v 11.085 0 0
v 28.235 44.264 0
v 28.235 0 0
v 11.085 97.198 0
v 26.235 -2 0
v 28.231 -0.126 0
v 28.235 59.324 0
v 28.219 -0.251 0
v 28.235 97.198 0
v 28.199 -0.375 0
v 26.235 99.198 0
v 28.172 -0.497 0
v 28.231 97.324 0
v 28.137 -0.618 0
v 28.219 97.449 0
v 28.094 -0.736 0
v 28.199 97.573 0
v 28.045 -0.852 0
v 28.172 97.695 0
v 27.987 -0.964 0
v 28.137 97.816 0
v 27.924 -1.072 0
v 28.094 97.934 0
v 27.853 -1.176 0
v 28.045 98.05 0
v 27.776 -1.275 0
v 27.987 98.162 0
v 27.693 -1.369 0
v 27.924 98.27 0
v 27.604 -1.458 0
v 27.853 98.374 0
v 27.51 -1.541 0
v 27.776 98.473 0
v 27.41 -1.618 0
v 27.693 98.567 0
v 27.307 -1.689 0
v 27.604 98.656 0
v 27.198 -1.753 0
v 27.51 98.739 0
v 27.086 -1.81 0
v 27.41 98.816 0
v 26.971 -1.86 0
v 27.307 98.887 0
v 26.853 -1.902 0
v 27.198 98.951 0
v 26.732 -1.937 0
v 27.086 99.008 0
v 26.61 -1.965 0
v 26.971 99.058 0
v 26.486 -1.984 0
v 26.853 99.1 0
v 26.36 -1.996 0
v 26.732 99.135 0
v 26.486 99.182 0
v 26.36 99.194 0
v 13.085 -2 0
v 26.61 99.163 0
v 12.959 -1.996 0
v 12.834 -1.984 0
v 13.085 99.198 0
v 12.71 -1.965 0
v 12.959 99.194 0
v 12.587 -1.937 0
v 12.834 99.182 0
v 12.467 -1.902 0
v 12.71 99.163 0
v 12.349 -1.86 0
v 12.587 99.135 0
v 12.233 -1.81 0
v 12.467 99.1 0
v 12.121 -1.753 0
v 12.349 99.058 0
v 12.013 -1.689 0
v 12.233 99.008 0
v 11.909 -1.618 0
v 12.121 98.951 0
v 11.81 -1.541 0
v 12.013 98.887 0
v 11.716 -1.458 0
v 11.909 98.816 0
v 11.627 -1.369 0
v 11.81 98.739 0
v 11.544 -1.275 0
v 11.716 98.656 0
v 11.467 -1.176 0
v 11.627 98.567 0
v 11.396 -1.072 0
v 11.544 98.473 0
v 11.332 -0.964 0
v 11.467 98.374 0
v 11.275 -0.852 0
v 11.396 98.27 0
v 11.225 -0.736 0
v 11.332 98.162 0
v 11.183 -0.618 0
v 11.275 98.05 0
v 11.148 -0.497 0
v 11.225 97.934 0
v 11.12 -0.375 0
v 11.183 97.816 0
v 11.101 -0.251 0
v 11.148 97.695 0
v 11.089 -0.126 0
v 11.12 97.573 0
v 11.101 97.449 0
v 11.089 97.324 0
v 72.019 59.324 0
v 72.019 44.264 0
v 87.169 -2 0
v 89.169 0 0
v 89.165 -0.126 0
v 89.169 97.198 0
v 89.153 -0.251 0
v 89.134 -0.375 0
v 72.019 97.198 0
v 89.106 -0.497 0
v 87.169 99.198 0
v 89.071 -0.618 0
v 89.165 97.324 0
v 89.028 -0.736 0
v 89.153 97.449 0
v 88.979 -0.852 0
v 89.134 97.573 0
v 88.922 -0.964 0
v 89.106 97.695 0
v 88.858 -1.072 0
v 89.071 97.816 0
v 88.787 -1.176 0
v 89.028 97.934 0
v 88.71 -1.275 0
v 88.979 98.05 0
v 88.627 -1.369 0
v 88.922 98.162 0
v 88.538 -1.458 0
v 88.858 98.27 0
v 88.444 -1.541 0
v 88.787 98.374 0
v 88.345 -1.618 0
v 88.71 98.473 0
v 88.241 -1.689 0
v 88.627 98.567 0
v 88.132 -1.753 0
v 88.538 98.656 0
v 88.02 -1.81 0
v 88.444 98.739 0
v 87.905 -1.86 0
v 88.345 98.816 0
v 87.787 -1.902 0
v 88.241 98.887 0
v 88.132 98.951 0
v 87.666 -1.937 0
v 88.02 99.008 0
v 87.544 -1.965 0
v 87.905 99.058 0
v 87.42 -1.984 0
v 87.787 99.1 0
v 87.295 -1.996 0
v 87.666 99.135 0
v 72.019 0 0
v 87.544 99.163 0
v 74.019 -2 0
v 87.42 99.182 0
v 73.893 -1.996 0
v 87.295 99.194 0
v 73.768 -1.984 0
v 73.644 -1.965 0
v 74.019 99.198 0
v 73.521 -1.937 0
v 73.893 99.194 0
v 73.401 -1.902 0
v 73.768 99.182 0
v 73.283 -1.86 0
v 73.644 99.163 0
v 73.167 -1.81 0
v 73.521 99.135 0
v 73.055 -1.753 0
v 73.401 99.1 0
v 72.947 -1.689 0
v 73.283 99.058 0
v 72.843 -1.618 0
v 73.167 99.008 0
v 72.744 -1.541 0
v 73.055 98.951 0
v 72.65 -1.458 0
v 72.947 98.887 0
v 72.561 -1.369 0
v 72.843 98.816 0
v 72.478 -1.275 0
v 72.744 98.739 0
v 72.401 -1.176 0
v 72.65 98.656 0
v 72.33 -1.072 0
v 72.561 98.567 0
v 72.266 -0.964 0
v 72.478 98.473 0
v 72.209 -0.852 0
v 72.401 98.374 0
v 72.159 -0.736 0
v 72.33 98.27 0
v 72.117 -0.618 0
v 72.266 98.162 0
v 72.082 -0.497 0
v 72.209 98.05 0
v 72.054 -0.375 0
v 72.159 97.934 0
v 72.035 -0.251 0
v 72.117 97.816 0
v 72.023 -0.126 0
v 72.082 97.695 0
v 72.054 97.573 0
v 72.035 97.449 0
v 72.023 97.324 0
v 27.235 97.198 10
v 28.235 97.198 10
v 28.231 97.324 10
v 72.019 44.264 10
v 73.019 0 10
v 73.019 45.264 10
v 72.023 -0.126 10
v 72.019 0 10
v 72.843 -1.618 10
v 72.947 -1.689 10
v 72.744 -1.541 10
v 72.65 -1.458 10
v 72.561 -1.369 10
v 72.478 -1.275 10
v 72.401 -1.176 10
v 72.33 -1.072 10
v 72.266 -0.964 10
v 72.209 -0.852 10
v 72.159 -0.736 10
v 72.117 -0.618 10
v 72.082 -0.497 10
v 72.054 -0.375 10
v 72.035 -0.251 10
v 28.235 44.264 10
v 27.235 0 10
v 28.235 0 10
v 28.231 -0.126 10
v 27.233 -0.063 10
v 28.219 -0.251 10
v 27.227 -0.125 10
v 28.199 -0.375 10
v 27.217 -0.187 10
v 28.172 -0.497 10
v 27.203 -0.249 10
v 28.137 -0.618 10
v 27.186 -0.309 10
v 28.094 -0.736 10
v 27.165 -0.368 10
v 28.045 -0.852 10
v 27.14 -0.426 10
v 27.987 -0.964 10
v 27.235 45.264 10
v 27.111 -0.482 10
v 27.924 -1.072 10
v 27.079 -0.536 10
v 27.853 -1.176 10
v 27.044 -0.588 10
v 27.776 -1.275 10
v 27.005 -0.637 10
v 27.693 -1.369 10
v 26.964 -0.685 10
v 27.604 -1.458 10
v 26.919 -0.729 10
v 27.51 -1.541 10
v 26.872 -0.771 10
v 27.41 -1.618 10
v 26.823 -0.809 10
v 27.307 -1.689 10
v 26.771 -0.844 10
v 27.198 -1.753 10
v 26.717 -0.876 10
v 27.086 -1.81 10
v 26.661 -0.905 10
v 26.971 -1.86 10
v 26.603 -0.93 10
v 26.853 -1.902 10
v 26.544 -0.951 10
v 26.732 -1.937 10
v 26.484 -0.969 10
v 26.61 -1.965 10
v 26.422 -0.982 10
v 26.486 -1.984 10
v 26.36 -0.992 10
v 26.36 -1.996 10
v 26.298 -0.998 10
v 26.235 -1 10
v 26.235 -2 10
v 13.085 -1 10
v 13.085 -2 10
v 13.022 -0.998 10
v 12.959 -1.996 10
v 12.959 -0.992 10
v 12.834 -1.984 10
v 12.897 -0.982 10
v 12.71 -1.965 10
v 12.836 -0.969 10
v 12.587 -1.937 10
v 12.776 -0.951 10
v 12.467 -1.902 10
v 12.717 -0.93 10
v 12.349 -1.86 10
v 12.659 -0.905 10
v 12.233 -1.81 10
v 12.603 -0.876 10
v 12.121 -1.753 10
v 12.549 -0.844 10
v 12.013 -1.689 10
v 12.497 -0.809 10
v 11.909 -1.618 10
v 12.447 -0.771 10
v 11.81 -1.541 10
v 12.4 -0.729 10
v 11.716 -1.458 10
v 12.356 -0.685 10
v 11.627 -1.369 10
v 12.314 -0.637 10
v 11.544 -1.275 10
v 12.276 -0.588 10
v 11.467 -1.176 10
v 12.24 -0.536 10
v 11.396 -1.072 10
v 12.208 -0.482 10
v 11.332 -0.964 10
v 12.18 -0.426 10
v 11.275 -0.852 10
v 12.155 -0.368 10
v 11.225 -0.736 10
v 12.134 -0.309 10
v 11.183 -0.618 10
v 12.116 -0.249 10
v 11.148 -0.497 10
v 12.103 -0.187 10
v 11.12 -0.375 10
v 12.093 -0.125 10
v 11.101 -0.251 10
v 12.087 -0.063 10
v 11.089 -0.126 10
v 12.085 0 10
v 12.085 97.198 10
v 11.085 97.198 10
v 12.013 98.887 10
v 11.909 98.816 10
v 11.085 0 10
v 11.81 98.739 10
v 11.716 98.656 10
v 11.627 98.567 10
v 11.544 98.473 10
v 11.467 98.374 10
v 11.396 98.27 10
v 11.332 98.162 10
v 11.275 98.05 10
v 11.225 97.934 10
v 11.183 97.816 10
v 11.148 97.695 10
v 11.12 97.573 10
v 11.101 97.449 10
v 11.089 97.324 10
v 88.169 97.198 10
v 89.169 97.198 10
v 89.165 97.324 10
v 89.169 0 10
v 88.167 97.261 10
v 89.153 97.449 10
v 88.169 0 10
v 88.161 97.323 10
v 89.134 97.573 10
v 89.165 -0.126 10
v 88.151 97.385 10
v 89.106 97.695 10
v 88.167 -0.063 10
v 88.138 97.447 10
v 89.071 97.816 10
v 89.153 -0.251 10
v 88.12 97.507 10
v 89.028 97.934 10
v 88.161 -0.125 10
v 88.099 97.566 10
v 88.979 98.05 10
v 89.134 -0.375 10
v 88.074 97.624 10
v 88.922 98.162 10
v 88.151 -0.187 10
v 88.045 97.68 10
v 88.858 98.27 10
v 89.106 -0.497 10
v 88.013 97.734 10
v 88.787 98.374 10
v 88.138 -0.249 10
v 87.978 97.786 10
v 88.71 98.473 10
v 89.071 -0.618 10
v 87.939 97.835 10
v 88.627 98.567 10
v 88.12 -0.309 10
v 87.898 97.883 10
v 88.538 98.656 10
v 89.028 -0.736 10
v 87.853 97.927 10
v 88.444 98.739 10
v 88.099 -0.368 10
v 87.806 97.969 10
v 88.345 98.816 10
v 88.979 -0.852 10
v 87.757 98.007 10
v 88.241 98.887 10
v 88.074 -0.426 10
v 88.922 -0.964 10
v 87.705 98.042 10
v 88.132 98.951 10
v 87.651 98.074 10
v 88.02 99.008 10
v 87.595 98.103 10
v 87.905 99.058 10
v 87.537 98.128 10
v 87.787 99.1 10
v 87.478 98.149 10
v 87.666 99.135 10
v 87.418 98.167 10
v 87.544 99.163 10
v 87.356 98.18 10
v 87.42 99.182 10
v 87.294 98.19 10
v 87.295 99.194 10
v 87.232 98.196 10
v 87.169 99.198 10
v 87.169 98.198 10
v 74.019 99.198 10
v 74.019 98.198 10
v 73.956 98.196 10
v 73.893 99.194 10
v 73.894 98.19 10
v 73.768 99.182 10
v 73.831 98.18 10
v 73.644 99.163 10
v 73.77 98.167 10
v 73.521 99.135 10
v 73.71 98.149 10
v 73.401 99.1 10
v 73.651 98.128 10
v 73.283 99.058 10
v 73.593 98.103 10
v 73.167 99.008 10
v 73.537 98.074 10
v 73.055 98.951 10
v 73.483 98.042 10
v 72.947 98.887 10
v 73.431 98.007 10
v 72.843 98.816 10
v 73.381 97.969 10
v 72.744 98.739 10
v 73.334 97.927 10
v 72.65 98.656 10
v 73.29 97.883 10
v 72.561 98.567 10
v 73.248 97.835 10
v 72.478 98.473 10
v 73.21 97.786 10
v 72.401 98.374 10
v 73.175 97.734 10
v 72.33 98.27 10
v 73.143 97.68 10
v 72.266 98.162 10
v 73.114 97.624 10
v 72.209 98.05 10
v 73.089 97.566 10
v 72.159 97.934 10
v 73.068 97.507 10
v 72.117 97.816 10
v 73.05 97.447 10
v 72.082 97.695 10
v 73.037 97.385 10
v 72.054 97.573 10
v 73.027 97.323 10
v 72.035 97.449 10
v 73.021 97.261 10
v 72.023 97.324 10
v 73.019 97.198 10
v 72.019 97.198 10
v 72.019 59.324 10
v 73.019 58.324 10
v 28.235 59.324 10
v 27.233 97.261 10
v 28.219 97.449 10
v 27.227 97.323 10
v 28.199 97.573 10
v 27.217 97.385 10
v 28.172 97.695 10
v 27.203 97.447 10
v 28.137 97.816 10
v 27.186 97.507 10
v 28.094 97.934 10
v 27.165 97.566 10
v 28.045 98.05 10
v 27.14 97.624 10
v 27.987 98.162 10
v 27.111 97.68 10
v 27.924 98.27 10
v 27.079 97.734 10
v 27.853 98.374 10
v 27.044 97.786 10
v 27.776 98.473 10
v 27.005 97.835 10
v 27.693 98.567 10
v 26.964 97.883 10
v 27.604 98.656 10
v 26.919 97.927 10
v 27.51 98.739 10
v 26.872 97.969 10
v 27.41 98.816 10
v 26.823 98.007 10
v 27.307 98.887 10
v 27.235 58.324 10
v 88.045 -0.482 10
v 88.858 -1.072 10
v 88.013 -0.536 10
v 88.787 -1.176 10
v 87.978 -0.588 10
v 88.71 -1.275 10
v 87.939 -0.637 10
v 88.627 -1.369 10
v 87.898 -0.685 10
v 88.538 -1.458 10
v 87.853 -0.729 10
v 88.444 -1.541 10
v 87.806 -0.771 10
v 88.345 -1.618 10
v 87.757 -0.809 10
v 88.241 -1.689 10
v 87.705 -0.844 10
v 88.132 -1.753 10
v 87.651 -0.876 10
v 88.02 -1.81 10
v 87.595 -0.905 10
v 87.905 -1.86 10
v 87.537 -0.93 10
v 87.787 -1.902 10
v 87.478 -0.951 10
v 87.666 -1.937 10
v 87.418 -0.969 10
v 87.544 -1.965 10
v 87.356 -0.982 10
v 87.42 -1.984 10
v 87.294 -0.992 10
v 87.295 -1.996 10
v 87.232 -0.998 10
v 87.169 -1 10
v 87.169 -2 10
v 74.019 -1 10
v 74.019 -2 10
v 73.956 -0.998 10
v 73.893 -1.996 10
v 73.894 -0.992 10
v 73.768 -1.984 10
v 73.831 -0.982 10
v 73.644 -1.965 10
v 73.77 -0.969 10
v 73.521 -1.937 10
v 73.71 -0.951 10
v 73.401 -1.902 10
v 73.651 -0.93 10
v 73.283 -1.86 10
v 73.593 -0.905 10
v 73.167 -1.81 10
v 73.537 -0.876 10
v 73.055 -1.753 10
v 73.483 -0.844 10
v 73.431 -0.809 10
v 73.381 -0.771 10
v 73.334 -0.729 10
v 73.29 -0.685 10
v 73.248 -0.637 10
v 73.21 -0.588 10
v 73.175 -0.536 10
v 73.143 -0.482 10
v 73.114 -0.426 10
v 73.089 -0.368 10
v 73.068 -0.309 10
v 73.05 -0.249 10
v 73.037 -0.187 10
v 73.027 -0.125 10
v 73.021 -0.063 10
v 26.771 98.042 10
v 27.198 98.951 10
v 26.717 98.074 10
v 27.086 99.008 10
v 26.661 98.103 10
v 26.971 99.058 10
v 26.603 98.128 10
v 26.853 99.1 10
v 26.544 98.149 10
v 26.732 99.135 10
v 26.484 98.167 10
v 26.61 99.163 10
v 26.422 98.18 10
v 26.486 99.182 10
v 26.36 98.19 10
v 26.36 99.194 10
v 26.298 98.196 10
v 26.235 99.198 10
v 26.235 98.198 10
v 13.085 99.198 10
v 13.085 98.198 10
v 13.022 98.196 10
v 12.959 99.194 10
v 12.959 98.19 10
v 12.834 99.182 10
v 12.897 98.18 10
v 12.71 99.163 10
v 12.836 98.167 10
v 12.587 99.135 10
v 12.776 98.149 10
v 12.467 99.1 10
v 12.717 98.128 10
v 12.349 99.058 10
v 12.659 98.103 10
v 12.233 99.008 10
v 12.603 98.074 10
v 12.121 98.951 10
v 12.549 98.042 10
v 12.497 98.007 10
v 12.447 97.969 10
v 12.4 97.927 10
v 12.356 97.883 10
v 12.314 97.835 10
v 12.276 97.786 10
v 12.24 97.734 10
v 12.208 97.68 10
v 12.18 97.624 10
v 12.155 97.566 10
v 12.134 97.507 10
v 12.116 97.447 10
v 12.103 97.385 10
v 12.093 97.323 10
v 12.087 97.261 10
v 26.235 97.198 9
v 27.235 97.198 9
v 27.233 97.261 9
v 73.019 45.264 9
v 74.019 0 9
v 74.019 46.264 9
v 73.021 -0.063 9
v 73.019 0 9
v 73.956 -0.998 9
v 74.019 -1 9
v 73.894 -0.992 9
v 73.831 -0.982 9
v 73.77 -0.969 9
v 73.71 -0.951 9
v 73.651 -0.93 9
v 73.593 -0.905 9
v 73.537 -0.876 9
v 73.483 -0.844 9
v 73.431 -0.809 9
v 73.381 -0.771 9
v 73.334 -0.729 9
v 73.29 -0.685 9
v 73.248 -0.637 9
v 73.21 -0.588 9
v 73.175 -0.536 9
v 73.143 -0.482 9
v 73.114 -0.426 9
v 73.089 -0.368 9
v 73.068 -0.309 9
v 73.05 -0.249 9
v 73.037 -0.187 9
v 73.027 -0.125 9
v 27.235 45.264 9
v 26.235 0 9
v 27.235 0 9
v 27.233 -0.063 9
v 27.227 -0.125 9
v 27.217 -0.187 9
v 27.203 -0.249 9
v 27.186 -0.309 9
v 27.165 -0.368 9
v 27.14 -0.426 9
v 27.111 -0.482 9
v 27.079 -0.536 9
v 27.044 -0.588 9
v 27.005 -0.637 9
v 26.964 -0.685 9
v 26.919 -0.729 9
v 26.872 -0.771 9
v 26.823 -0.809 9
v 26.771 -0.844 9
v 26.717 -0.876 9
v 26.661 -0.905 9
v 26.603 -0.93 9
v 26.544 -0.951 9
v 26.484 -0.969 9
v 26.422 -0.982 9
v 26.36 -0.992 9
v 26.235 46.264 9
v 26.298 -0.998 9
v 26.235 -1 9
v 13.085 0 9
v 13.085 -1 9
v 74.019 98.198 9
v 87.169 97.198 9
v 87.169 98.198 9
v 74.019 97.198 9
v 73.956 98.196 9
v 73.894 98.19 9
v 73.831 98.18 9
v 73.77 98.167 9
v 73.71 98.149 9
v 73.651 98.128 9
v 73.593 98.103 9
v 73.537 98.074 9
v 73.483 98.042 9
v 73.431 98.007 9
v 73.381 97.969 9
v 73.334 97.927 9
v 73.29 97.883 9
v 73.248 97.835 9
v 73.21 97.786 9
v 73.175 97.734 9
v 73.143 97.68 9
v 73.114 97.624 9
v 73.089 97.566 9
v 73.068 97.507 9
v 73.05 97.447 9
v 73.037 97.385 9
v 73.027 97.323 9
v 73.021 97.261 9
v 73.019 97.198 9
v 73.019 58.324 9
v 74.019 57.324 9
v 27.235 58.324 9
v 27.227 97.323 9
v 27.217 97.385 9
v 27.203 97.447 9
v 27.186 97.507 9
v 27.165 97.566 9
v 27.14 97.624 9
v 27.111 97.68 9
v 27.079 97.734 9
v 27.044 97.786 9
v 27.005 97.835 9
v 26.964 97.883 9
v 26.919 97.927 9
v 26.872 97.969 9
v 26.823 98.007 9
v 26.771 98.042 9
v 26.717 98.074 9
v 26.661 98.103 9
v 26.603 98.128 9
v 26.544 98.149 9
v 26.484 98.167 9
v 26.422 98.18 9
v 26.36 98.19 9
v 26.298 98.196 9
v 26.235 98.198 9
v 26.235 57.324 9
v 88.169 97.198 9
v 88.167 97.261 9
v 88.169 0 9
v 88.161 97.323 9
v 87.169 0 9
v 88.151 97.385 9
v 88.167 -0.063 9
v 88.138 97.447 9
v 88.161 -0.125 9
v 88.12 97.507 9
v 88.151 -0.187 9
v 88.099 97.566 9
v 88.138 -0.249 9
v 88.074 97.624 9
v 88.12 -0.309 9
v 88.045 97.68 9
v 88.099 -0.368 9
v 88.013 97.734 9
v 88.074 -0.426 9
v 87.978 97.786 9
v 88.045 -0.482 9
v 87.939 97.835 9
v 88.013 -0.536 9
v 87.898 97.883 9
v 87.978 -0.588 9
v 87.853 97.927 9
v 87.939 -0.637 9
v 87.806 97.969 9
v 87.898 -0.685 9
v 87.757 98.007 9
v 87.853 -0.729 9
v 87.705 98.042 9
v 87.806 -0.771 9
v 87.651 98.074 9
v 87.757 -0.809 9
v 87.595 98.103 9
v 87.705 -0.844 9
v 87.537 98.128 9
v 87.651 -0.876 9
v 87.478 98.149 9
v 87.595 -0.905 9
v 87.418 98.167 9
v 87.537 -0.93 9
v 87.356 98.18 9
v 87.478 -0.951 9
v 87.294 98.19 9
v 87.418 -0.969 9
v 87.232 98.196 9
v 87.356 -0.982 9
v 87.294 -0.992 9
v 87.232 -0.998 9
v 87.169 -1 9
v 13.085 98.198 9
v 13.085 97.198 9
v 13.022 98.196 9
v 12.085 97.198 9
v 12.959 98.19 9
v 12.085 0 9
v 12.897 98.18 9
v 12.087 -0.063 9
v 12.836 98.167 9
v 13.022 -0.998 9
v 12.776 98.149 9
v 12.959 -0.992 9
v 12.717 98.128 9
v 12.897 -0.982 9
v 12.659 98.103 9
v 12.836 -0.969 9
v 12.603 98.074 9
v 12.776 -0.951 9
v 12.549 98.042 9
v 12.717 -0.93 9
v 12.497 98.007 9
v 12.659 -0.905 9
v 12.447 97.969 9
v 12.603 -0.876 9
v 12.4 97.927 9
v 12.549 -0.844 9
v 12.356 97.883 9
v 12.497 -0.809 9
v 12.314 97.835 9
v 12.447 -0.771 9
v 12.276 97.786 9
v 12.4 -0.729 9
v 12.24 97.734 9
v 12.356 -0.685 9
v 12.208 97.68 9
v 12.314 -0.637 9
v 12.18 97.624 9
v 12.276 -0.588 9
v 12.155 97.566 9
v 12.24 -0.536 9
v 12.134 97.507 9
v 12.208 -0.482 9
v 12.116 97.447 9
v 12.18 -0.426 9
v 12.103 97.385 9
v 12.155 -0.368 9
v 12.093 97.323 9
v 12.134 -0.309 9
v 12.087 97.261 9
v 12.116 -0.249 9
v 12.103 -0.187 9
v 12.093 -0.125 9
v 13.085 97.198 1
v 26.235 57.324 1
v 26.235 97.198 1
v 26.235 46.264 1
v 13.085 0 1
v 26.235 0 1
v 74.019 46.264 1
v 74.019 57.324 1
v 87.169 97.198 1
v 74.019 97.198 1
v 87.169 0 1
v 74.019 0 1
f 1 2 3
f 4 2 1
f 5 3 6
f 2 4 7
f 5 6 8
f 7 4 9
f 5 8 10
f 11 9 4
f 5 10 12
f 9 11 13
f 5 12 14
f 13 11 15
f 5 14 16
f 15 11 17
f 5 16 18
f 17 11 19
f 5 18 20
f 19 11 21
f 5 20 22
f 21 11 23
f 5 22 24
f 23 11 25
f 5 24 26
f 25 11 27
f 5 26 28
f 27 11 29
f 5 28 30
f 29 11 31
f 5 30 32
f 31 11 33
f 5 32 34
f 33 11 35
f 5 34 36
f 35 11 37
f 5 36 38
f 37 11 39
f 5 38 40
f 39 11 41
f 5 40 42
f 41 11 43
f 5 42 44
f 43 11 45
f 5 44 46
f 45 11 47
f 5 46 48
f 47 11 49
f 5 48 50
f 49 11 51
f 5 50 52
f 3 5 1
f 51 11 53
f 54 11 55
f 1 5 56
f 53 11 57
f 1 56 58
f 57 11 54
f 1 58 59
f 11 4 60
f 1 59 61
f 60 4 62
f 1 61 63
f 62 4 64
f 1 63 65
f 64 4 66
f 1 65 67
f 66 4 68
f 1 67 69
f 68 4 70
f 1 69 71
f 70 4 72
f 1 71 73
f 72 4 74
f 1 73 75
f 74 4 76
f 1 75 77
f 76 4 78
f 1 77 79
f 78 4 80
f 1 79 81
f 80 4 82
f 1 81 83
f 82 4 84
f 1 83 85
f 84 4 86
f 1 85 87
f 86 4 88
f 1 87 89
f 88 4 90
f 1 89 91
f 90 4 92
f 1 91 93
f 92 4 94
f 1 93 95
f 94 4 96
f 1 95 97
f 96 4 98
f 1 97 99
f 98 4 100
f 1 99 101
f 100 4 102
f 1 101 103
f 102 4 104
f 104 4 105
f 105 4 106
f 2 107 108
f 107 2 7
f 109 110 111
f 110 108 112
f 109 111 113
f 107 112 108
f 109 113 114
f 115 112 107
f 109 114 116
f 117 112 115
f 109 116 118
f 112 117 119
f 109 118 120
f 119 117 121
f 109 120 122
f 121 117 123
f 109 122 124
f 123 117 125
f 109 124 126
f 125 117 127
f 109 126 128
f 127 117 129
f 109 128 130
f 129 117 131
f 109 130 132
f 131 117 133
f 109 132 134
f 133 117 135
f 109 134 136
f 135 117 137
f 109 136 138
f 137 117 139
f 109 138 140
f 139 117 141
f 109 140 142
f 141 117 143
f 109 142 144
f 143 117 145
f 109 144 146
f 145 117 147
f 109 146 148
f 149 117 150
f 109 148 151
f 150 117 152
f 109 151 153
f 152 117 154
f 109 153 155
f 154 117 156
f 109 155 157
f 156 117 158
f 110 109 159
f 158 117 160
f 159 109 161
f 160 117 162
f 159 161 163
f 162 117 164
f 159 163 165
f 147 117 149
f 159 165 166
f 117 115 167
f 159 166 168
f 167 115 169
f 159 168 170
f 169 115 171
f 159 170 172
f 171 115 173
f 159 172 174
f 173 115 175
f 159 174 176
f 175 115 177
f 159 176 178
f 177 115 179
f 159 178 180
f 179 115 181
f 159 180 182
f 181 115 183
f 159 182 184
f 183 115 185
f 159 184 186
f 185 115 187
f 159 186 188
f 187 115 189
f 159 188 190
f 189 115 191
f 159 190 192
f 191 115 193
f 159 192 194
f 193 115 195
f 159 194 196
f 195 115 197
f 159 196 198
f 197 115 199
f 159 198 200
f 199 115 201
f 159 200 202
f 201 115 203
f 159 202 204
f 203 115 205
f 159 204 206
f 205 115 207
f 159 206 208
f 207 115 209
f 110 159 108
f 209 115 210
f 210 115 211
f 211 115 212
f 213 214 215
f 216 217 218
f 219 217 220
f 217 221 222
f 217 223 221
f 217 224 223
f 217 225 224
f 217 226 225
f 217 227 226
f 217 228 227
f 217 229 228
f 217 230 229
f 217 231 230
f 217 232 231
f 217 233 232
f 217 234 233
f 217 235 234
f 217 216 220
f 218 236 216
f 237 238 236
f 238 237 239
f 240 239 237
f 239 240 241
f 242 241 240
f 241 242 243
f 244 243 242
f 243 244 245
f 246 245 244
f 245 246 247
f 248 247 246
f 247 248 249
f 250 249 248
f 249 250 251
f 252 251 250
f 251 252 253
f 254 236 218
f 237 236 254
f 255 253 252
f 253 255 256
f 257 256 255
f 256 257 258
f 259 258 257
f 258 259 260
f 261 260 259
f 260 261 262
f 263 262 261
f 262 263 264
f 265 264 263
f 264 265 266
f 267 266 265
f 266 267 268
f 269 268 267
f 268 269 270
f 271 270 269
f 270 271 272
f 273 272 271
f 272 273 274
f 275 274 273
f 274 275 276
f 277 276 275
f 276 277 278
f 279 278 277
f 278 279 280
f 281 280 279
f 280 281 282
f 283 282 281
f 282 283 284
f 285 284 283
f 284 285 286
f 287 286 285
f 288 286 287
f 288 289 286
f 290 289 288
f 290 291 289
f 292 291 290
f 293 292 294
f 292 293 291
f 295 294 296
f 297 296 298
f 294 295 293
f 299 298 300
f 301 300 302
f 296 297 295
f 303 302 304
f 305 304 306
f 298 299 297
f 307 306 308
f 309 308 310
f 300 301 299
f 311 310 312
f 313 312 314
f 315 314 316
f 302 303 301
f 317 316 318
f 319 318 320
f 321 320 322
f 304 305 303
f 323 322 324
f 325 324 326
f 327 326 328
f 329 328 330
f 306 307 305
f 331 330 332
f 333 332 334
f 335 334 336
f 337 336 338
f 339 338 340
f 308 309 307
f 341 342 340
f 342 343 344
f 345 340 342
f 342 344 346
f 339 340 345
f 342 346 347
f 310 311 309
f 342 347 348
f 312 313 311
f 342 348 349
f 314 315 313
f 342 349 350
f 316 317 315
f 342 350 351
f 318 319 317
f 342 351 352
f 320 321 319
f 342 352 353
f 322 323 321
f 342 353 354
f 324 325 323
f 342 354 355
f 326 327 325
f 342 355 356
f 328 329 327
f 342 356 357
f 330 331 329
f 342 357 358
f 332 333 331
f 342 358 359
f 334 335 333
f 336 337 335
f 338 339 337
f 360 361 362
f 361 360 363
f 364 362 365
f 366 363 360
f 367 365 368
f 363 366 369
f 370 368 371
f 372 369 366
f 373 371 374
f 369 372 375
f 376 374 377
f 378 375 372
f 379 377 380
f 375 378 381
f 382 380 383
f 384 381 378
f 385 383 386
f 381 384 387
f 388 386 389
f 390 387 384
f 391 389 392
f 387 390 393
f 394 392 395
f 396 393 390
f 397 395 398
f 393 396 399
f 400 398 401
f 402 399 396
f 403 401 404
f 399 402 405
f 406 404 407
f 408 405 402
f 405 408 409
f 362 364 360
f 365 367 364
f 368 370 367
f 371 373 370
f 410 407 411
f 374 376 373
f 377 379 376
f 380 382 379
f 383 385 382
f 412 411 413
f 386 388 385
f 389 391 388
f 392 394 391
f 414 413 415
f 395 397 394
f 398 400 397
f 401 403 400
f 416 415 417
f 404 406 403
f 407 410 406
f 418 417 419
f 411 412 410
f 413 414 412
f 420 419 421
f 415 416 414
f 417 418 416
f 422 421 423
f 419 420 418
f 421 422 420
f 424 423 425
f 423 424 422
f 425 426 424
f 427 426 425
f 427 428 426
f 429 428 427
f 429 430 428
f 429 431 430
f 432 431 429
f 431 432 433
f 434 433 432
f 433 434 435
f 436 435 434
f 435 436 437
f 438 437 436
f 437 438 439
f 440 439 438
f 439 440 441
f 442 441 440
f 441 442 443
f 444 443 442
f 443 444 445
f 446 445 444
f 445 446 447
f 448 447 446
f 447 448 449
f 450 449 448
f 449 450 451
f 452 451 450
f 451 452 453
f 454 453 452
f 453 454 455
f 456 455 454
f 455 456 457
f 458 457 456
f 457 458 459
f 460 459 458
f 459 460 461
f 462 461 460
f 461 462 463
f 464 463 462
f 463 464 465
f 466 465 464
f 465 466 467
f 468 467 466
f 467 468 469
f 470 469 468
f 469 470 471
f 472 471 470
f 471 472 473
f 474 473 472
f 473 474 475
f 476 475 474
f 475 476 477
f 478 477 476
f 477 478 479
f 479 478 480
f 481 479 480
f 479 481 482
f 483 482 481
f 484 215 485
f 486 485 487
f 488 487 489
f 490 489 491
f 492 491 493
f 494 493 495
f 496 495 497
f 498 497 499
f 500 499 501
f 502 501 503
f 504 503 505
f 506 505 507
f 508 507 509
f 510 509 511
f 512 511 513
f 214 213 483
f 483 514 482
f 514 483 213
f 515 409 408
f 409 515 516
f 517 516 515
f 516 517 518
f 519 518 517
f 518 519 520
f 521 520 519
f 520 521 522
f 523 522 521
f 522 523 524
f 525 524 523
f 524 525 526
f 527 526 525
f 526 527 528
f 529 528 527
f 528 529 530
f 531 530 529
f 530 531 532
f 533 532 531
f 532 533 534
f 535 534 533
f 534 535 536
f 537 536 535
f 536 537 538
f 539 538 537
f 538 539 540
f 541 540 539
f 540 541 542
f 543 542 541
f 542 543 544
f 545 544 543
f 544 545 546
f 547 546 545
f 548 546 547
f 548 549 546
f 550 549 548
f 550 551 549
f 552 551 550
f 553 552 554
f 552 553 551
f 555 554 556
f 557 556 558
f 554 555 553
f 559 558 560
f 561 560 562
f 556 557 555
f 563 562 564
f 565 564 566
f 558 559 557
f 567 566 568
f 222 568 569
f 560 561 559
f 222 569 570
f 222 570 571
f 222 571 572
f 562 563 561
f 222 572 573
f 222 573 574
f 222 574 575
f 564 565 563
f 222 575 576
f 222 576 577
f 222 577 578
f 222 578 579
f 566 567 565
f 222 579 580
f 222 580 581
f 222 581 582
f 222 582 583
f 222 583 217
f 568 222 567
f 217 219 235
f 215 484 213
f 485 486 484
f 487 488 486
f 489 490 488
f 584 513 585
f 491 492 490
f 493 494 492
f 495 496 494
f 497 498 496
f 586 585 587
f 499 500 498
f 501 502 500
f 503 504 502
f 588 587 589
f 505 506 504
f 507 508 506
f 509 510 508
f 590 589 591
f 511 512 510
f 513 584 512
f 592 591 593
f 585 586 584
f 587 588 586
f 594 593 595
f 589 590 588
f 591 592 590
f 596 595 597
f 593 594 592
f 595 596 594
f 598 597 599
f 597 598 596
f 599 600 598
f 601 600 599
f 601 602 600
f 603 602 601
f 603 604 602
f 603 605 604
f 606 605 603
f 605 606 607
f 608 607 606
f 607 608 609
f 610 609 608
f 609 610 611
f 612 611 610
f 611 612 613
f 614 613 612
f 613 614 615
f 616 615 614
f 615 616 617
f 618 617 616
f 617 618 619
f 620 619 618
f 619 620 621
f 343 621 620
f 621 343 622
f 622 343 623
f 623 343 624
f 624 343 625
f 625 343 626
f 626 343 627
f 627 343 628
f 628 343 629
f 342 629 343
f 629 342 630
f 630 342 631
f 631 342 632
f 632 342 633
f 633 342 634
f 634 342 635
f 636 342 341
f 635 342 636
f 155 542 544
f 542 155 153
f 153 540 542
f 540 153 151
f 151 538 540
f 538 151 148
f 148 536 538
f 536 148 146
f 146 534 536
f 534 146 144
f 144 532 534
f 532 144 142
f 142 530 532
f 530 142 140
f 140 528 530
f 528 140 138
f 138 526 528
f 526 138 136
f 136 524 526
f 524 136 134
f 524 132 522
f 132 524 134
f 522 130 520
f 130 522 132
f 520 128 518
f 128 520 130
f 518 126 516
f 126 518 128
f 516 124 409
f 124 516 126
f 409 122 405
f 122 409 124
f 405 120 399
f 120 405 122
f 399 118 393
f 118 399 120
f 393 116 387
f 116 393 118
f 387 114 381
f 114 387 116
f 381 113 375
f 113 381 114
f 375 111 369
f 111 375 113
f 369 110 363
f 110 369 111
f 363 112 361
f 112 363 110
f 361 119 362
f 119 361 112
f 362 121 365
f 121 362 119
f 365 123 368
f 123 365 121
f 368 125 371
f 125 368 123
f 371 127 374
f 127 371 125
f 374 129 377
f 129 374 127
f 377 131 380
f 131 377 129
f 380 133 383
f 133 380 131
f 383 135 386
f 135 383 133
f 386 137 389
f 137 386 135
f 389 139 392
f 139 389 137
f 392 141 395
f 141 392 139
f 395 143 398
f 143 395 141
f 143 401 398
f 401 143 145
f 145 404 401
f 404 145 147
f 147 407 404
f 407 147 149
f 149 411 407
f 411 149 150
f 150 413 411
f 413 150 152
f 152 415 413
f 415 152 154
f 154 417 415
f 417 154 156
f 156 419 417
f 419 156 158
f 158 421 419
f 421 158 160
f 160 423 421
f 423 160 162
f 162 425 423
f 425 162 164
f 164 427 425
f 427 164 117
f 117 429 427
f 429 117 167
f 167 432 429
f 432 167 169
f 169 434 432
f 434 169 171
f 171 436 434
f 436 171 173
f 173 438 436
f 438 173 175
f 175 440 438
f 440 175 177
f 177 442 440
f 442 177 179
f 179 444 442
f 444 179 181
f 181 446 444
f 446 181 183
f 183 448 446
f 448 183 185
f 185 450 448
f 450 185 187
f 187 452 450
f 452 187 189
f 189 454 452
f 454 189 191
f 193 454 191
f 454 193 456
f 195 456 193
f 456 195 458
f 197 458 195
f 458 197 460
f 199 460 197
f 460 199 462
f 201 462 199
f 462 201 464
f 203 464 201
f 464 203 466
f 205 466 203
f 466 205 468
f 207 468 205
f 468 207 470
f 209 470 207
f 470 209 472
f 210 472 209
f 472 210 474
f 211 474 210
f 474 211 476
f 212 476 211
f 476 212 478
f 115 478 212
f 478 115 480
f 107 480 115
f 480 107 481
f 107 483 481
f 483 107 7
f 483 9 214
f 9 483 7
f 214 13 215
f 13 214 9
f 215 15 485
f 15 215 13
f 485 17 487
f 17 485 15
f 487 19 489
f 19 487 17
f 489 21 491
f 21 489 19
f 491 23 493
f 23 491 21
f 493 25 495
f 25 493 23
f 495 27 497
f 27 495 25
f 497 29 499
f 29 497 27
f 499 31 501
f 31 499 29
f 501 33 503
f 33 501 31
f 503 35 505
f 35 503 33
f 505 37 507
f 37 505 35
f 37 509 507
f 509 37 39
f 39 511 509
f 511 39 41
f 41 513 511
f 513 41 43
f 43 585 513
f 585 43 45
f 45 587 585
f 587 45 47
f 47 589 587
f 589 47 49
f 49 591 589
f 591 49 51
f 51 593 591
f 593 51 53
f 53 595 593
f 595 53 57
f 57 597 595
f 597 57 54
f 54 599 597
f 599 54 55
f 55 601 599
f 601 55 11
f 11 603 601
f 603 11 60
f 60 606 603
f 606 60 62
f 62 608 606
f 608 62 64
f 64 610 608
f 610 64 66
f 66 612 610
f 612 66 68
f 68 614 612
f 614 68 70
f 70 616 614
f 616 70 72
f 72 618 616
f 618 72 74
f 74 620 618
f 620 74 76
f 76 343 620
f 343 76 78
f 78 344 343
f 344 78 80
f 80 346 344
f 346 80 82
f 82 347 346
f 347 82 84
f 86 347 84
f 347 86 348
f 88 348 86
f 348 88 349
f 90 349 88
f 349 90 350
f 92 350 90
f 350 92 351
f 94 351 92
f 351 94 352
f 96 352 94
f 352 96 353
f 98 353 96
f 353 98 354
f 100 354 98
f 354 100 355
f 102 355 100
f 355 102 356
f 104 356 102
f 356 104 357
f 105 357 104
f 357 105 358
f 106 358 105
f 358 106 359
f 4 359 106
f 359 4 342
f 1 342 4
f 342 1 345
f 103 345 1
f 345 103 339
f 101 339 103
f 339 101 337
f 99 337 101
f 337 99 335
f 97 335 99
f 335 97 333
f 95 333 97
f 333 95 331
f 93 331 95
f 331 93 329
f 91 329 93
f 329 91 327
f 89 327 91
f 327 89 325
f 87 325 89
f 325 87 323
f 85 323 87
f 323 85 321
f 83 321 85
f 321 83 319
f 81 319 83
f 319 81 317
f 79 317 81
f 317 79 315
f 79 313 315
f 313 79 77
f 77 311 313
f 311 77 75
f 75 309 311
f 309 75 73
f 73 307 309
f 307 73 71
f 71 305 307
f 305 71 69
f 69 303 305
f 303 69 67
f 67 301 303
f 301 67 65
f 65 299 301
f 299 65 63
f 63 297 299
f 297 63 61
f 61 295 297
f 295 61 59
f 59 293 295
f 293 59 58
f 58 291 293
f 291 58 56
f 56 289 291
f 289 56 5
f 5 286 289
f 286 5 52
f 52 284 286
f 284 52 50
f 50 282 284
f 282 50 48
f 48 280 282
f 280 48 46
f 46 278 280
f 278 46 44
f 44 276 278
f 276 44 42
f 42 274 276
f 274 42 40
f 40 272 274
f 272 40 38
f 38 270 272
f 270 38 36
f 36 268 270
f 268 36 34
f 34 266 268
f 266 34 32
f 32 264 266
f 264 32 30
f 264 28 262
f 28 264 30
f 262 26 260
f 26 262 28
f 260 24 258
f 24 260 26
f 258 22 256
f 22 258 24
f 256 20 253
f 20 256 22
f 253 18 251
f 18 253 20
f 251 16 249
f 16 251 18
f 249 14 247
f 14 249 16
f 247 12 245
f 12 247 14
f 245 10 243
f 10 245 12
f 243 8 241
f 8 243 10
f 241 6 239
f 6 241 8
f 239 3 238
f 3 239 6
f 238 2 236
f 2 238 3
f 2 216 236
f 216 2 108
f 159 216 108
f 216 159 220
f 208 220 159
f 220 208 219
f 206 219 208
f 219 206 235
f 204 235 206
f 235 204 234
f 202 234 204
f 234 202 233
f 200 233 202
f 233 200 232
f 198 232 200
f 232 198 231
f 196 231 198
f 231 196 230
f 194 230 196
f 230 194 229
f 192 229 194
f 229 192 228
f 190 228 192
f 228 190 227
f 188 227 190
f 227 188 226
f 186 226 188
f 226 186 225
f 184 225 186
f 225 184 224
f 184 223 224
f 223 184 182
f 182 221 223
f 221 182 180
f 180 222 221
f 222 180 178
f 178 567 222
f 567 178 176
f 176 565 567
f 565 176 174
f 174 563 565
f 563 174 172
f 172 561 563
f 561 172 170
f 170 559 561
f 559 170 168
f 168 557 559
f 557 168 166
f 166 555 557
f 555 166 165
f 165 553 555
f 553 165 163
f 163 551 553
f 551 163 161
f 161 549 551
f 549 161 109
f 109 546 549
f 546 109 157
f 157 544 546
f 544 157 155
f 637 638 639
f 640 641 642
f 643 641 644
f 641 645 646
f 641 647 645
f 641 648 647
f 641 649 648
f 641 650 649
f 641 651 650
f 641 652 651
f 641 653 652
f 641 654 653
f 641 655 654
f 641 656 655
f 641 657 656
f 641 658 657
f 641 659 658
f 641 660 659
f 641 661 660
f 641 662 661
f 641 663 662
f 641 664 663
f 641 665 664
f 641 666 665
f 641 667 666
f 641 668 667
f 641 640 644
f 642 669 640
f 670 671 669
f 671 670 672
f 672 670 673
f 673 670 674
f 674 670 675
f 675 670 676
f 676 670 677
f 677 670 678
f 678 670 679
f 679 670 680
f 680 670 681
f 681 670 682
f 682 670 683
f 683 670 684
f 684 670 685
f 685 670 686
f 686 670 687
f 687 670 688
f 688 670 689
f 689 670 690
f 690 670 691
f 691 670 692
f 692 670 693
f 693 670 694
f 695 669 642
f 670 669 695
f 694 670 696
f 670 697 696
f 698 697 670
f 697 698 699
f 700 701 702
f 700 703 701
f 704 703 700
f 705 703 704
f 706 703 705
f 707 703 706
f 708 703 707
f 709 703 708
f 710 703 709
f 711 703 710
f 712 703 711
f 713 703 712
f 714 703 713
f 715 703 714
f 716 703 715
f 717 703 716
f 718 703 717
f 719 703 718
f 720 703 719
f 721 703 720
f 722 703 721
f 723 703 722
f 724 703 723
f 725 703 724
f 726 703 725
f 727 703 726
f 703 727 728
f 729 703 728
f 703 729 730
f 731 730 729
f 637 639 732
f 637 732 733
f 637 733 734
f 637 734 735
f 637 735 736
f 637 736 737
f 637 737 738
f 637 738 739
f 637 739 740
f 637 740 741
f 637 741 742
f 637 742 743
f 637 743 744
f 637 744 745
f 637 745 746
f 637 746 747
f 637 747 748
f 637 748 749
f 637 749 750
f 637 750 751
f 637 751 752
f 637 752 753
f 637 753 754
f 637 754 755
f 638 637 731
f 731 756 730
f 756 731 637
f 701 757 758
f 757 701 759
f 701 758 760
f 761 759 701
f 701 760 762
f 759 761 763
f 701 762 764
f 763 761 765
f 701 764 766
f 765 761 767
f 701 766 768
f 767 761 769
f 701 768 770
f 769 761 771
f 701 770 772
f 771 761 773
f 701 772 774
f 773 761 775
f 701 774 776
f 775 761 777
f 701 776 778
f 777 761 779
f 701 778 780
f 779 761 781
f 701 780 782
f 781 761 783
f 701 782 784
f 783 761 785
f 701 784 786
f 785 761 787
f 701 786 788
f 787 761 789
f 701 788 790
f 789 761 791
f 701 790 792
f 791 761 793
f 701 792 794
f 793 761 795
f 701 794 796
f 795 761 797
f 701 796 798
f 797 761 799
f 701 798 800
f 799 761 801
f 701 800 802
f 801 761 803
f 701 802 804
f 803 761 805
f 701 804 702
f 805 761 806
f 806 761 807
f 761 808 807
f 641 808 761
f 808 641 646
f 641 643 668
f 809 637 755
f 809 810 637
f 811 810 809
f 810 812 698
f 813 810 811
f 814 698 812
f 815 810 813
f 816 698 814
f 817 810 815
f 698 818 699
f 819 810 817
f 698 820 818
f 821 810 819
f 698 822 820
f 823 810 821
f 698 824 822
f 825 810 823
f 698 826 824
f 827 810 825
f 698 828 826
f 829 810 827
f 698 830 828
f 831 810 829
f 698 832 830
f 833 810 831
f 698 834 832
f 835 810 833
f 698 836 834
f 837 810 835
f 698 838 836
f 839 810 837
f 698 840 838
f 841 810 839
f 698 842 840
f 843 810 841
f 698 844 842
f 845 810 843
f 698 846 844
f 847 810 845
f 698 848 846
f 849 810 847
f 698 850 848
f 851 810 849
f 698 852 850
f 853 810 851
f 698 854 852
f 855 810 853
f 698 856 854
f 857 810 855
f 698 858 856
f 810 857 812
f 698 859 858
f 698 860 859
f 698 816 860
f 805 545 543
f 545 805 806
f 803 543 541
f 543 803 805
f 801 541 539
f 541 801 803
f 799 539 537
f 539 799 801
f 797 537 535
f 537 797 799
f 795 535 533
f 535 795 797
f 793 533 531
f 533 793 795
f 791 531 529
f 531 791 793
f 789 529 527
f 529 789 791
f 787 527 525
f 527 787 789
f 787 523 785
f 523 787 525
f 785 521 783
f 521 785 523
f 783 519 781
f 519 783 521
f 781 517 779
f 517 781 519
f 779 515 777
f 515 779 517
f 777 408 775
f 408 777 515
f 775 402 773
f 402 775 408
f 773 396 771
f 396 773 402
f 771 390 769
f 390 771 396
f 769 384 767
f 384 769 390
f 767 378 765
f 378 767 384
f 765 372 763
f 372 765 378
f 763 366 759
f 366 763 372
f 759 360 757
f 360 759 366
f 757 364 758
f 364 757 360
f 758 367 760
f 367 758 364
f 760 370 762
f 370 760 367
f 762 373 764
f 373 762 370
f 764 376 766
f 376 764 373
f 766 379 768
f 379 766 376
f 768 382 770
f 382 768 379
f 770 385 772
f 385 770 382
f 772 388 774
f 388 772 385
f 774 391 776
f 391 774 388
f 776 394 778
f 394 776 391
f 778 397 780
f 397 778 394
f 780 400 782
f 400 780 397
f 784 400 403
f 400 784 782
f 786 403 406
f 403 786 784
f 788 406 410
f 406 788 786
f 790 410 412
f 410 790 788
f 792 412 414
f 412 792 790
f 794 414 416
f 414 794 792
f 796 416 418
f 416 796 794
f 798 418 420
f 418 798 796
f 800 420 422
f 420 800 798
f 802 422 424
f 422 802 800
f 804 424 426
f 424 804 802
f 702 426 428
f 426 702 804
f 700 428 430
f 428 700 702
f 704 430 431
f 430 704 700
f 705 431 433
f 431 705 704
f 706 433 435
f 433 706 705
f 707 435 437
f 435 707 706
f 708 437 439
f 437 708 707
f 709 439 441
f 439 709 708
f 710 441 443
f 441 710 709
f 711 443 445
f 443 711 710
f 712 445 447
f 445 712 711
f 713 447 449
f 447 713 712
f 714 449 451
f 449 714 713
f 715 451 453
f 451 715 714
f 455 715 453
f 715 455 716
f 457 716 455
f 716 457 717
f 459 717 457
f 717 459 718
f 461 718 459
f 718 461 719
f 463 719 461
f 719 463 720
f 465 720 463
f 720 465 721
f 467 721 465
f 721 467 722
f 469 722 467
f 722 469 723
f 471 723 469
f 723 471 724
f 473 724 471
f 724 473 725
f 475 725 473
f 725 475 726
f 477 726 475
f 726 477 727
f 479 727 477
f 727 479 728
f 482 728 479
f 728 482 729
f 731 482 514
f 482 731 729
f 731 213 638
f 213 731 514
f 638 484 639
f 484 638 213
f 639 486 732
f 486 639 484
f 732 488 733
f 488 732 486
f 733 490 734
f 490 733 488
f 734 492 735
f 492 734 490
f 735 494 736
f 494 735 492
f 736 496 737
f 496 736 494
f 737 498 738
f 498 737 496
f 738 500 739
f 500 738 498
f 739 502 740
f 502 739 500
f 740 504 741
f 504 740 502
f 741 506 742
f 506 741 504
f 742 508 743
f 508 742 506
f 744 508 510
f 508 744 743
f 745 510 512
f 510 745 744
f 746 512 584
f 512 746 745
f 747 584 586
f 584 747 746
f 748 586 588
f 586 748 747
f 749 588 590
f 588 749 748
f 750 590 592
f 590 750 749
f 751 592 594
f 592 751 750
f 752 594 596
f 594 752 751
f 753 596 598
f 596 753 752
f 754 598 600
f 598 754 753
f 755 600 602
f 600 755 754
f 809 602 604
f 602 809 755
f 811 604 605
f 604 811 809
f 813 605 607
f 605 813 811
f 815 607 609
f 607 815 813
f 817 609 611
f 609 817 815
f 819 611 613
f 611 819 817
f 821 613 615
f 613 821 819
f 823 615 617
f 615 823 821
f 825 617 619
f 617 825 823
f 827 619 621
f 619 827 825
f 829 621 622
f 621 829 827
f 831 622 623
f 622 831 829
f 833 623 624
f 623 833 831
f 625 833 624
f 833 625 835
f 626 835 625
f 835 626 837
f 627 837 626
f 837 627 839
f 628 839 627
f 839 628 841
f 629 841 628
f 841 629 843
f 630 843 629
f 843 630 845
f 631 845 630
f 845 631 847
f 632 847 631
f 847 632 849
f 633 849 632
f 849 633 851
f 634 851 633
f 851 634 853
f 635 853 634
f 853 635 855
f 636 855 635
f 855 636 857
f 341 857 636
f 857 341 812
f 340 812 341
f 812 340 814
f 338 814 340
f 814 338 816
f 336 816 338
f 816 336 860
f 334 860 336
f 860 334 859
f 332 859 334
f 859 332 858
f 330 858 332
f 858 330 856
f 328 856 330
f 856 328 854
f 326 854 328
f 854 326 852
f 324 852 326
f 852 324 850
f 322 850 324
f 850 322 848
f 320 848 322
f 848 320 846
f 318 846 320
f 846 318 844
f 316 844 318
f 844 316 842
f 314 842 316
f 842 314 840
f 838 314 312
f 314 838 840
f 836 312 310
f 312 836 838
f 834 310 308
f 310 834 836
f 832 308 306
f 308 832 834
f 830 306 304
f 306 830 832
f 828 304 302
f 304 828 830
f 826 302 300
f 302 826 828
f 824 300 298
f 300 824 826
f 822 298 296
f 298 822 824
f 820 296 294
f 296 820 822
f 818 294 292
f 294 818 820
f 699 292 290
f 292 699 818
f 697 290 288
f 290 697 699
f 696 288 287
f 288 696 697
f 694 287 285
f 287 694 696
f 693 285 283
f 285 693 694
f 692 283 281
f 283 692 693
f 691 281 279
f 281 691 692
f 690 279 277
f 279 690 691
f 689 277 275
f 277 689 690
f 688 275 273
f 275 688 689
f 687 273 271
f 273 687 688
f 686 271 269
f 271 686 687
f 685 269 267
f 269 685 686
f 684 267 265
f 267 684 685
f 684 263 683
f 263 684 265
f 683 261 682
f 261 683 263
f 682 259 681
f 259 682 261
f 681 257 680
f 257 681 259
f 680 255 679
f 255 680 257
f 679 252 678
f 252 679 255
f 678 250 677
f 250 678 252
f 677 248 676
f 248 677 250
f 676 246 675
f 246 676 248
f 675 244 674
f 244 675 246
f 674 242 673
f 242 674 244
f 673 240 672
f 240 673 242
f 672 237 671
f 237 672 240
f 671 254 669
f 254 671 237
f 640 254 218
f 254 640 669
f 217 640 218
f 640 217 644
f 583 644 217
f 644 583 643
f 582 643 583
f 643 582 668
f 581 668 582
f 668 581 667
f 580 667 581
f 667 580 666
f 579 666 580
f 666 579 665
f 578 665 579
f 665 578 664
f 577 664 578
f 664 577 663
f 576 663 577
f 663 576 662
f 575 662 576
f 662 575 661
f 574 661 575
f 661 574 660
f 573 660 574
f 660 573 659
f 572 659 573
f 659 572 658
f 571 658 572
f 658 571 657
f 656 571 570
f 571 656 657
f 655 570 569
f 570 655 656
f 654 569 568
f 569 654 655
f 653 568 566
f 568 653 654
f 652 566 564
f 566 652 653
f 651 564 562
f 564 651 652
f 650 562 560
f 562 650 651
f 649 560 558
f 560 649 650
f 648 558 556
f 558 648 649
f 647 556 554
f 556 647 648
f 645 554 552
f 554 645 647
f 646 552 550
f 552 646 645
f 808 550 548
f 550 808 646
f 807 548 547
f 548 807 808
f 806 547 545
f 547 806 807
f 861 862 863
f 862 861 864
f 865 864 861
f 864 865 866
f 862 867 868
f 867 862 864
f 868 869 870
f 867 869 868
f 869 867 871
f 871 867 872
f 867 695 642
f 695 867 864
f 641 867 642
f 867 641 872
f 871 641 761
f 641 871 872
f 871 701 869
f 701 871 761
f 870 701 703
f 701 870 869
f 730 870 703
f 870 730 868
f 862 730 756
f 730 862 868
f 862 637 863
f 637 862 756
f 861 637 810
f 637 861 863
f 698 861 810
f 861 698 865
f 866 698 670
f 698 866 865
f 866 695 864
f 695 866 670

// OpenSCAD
//Sign body maker V3 - bigclivedotcom
letter = "H"; //Sign character to make
style = "Noto Mono"; //See "Help" and "Font List"
size = 100; //Size of character (height)
depth = 10; //Depth of sign character
$fn=100; //Curve facets - higher is smoother
walls = 2; //Side wall thickness
base=1; //Base thickness (-1 for open back)
face = 1; //Face thickness
//Don't change variables below here
sized=size-(2*walls);
difference(){
     linear_extrude(height=depth)
	  minkowski(){
	  text(letter,sized,style);
	  circle(walls);
     }
//Lip for front face (half wall thickness)
     translate([0,0,depth-face])
	  linear_extrude(height=2*face)
	  minkowski(){
	  text(letter,sized,style);
	  circle(walls/2);
     }
//hollow core of letter
     translate([0,0,base])
	  linear_extrude(height=depth+2)
	  text(letter,sized,style);
}
